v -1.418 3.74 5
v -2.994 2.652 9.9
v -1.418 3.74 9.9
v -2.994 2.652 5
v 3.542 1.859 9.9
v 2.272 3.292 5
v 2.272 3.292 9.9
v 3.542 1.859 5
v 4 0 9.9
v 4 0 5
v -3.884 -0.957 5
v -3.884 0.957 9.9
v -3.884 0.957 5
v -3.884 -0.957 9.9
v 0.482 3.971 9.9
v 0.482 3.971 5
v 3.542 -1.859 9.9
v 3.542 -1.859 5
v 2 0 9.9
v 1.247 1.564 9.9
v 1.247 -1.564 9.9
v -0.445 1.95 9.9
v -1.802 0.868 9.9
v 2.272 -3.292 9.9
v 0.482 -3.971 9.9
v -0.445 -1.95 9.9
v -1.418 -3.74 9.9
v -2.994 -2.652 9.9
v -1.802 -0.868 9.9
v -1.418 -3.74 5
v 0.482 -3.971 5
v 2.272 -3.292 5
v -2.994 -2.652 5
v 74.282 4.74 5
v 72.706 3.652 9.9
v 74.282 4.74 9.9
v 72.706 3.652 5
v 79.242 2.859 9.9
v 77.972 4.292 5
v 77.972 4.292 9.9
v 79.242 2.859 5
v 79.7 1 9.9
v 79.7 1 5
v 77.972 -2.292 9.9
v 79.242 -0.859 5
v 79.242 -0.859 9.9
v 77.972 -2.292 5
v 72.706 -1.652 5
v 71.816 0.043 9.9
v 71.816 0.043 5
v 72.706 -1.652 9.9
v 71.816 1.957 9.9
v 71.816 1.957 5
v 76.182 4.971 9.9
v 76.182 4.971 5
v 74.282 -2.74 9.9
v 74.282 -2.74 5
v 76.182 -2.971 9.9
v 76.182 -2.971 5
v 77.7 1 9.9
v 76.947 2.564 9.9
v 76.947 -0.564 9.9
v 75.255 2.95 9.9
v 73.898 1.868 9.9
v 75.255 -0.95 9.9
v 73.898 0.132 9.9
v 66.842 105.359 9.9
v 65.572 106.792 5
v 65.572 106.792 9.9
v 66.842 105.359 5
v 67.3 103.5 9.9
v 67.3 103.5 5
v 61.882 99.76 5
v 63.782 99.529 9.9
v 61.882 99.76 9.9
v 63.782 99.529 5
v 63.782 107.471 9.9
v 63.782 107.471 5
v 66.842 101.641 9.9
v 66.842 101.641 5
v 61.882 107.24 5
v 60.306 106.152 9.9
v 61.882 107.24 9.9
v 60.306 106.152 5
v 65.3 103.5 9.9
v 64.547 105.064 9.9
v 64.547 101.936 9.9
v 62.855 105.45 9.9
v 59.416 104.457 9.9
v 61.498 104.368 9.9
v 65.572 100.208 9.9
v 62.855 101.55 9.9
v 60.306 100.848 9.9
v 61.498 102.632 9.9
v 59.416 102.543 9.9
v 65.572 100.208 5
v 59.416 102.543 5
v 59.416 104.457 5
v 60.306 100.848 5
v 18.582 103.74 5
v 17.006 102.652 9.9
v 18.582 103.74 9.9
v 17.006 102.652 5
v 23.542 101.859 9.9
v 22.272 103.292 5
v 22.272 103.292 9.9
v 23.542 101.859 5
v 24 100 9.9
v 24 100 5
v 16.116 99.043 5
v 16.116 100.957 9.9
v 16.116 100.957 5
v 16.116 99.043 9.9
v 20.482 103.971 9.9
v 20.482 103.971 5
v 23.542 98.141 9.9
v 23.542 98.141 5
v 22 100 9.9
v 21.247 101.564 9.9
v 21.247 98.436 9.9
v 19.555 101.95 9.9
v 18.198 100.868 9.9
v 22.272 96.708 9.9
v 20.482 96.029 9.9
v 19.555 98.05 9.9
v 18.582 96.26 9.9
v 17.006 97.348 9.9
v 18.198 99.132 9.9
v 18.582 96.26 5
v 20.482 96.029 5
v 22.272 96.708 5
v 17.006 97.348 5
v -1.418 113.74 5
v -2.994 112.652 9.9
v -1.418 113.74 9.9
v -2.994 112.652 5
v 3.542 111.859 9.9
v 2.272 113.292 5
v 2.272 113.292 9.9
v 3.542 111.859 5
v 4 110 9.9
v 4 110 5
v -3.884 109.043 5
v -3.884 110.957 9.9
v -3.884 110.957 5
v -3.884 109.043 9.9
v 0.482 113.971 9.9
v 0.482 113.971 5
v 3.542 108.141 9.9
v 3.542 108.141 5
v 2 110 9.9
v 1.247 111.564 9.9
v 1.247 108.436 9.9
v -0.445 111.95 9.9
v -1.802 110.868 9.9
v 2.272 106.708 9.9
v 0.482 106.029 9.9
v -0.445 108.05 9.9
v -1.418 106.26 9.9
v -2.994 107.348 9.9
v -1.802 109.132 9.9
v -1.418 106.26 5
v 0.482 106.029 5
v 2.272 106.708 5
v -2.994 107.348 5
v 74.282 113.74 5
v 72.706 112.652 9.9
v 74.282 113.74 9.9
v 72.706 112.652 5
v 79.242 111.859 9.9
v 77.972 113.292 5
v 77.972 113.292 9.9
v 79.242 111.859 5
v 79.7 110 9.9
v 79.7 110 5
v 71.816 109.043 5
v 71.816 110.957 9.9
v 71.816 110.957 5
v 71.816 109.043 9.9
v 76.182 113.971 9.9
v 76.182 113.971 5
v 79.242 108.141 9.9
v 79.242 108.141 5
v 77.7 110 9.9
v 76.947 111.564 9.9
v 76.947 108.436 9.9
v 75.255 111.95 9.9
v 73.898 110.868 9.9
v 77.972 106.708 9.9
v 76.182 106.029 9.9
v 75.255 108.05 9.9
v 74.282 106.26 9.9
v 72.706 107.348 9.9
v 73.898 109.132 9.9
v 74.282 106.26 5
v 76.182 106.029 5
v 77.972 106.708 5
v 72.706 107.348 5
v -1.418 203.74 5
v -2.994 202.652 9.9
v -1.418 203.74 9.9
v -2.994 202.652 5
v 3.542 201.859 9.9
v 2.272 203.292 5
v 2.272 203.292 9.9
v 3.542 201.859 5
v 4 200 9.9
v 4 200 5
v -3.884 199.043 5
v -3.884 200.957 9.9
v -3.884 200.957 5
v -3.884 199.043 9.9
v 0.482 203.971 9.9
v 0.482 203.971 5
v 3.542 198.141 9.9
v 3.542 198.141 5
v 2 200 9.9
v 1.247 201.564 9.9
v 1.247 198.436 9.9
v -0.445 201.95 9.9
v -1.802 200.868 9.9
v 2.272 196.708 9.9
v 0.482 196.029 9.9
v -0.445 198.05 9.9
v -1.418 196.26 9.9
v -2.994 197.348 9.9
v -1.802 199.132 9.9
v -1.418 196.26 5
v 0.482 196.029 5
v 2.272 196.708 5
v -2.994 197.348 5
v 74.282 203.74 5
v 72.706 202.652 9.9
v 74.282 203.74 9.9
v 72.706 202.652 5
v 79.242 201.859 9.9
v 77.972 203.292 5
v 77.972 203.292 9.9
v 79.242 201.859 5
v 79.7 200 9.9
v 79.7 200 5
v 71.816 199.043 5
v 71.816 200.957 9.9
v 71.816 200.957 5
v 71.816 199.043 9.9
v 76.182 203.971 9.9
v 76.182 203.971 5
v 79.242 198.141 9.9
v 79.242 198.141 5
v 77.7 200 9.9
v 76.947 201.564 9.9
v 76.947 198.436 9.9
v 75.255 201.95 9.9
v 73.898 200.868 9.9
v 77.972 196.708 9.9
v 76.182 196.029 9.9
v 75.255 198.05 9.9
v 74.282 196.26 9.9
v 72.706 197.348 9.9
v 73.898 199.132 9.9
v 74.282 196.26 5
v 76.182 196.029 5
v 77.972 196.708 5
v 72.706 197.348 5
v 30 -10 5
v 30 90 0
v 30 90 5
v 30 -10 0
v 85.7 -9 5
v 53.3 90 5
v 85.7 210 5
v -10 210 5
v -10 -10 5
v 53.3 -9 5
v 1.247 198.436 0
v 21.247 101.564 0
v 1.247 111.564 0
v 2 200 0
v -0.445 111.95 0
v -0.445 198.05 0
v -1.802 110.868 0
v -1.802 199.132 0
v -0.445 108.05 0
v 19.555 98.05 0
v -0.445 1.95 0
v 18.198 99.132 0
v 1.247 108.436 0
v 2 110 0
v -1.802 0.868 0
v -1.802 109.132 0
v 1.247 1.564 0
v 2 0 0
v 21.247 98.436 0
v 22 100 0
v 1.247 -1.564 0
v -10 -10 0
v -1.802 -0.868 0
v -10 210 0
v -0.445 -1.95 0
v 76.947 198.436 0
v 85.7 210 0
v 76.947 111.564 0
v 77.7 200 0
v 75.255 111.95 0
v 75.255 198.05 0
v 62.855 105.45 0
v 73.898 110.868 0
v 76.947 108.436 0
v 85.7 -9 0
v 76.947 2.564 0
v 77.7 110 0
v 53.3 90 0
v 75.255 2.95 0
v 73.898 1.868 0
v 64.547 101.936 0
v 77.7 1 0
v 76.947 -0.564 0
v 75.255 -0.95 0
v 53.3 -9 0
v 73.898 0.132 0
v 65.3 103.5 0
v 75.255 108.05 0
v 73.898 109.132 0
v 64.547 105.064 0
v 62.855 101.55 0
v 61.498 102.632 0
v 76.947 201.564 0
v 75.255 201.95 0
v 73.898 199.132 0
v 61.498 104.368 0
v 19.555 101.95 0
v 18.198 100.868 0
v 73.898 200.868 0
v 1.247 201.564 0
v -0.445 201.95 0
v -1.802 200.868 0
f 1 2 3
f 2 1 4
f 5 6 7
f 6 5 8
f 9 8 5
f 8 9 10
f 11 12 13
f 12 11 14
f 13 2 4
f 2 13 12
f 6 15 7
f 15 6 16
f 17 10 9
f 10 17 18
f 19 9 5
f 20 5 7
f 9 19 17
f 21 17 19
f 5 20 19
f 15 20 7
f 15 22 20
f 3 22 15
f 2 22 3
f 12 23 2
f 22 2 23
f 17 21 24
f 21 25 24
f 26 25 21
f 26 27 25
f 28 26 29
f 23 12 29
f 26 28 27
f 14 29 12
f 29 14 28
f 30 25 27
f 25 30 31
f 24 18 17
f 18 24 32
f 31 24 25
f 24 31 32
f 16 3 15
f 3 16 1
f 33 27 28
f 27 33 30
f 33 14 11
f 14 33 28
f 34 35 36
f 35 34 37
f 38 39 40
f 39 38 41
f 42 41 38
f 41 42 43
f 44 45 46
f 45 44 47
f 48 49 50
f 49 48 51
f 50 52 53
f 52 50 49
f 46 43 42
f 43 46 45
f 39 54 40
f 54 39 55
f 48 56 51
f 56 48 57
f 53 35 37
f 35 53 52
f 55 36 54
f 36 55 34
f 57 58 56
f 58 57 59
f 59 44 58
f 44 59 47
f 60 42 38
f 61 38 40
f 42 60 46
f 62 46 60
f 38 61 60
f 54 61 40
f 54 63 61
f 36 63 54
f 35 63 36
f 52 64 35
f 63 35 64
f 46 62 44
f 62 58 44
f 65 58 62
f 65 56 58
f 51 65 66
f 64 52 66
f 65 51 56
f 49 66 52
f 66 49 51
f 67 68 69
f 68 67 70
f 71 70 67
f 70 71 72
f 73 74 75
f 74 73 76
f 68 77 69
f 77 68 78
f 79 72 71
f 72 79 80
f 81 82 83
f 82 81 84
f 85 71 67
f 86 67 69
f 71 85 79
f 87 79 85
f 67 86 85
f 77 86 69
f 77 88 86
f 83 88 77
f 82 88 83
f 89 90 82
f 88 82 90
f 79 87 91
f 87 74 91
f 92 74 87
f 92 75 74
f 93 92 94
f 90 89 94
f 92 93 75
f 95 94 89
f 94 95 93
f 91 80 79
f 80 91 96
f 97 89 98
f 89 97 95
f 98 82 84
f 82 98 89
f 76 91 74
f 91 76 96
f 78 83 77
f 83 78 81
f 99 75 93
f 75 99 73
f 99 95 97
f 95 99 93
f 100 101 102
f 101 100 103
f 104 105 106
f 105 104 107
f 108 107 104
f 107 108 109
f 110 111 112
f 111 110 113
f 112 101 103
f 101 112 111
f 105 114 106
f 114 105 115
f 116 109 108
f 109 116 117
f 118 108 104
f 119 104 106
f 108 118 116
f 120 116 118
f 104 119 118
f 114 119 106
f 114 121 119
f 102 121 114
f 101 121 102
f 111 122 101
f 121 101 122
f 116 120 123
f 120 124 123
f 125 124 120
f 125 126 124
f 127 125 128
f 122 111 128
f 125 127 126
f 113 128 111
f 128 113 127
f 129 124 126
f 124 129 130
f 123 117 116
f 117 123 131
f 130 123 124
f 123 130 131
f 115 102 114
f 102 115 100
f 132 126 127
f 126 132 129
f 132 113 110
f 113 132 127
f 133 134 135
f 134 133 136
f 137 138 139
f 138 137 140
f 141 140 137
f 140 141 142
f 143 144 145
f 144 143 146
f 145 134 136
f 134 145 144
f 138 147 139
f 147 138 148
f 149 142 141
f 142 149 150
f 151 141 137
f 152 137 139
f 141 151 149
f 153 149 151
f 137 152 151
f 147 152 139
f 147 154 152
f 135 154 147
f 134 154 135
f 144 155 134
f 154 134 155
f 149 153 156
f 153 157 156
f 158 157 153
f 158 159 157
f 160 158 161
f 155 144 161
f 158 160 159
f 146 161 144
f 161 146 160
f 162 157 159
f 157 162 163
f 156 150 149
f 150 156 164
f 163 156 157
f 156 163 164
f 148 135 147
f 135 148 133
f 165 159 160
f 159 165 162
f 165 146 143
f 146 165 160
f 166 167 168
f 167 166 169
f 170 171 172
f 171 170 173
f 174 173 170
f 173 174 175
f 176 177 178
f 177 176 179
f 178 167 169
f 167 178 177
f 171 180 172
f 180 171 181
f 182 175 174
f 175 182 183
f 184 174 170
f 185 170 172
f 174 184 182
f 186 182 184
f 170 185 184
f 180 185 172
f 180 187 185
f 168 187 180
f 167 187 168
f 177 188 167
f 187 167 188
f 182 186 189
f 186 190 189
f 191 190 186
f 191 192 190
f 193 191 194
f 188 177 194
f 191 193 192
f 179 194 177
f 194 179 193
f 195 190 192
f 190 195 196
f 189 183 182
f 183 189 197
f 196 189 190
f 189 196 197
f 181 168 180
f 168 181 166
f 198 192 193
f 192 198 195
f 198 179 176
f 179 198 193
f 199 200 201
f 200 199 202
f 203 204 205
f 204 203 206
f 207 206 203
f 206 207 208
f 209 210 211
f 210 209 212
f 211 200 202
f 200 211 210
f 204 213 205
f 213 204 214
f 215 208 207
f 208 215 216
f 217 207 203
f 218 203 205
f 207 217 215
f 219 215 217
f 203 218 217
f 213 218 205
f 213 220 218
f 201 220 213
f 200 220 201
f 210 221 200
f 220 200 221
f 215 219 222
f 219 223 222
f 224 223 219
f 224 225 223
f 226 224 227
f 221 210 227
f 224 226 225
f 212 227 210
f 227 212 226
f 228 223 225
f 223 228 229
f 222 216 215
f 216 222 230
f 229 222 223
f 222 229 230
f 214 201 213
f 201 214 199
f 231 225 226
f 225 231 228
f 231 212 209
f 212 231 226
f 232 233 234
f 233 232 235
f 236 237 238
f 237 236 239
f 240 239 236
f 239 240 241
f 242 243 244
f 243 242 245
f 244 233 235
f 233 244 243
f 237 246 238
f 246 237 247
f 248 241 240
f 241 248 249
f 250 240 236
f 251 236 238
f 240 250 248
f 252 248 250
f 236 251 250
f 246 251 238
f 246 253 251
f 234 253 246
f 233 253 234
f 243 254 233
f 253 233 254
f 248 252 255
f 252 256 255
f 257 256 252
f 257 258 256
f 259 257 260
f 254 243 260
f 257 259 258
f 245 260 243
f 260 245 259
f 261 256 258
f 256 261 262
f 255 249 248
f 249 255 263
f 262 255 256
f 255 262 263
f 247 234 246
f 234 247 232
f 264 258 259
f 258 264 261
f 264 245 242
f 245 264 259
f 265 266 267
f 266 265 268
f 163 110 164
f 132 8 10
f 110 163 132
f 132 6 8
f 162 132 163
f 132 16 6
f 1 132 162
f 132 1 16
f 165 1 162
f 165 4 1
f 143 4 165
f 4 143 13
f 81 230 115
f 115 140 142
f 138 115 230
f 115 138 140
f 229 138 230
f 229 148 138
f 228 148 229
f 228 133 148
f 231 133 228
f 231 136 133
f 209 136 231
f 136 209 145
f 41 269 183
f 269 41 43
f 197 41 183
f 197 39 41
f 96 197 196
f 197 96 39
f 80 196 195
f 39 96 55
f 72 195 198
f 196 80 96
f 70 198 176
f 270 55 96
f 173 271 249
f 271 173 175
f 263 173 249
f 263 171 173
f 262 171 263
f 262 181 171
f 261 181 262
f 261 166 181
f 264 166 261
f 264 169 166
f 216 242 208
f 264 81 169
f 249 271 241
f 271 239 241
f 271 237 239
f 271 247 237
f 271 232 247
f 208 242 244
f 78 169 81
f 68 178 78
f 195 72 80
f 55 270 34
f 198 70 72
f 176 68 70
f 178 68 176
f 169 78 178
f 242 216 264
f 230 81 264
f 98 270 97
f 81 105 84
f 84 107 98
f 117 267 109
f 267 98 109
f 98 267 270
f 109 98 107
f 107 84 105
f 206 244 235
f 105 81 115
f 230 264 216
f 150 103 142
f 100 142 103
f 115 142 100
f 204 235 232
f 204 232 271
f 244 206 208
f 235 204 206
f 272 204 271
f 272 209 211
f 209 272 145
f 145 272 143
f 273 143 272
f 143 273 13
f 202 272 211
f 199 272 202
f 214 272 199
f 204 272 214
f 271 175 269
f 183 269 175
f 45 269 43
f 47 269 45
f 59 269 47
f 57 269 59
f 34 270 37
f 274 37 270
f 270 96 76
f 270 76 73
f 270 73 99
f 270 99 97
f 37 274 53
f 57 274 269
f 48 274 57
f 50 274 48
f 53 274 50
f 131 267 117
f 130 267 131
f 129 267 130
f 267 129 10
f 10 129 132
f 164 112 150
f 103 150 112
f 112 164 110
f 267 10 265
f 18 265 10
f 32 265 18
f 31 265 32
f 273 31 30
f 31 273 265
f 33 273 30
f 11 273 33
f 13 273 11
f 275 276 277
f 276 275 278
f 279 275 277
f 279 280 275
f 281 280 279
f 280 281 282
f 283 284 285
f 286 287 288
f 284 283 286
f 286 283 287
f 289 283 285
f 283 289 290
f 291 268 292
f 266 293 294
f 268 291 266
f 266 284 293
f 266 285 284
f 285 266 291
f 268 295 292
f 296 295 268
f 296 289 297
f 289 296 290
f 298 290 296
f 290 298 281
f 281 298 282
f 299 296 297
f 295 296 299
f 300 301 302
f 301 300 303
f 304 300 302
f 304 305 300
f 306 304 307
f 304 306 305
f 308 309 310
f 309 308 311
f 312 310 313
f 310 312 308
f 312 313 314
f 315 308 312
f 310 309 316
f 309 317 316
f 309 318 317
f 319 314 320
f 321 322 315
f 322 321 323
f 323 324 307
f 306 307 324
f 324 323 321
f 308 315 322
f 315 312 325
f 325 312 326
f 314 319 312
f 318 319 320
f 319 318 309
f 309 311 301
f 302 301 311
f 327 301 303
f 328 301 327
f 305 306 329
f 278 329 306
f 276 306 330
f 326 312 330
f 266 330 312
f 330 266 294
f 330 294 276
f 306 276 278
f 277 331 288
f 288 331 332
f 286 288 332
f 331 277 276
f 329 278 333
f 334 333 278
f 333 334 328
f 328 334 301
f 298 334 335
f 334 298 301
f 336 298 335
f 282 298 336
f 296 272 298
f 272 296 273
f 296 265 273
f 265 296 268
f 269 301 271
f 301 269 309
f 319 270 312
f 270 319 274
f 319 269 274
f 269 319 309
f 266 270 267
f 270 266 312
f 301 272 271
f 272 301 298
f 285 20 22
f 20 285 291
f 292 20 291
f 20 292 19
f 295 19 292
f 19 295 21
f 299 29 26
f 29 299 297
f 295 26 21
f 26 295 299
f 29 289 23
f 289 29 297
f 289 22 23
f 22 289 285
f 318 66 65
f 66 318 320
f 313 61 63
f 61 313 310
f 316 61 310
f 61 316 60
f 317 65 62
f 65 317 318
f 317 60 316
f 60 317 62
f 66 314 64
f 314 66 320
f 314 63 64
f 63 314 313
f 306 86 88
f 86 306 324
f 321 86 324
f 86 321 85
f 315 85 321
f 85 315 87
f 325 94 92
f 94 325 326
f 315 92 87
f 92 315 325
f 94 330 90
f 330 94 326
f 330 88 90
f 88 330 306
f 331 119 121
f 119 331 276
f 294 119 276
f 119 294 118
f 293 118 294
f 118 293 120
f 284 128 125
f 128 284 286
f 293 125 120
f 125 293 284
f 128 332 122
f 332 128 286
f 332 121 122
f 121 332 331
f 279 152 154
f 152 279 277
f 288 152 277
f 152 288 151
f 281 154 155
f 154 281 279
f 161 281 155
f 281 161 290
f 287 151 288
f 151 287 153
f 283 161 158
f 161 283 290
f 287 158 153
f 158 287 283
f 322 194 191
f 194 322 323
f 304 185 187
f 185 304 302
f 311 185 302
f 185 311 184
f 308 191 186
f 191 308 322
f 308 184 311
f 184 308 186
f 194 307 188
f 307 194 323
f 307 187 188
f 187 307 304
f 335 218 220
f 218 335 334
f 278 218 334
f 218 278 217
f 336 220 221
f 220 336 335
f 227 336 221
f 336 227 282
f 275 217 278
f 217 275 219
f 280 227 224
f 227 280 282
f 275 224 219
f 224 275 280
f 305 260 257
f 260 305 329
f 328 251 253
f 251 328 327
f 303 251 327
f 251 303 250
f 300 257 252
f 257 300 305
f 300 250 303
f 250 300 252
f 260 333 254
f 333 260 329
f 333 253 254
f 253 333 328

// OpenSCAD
$fa = 5;
plateThickness = 5;
offsetHeight = 5;
boltDiameter = 4;
plateExtension = 10;

module boltOuter() {
    translate([0,0, plateThickness+offsetHeight/2-0.1])
        cylinder(h = offsetHeight, d = 2 * boltDiameter, center = true);
}

module boltInner() {
    totalHeight = offsetHeight + plateThickness + 0.2;
    translate([0,0,totalHeight/2-0.1])
        cylinder(h = totalHeight, d = boltDiameter, center = true);
}

boltLocations = [[0,0],
    [75.7,1],
    [75.7-12.4,103.5],
    [20,100],
    [0,110],
    [75.7,110],
    [0,200],
    [75.7,200]];

module boltBar(index1, index2){
    translate([(boltLocations[index1][0]+boltLocations[index2][0])/2,
        (boltLocations[index1][1]+boltLocations[index2][1])/2,
        plateThickness/2])
    cube([abs(boltLocations[index1][0]-boltLocations[index2][0]) + 2* plateExtension,
            abs(boltLocations[index1][1]-boltLocations[index2][1]) + 2* plateExtension, plateThickness], center = true);
}

module plateBeforeHoles() {
    for(bolt = [1:len(boltLocations)]) {
        translate([boltLocations[bolt-1][0],
            boltLocations[bolt-1][1],0])
                boltOuter();
    }
    boltBar(0,3);
    boltBar(1,2);
    boltBar(2,3);
    boltBar(5,6);
}

module plate() {
    difference() {
        plateBeforeHoles();
        for(bolt = [1:len(boltLocations)]) {
            translate([boltLocations[bolt-1][0],
                boltLocations[bolt-1][1],0])
                    boltInner();
    }
        
    }
}
plate();
